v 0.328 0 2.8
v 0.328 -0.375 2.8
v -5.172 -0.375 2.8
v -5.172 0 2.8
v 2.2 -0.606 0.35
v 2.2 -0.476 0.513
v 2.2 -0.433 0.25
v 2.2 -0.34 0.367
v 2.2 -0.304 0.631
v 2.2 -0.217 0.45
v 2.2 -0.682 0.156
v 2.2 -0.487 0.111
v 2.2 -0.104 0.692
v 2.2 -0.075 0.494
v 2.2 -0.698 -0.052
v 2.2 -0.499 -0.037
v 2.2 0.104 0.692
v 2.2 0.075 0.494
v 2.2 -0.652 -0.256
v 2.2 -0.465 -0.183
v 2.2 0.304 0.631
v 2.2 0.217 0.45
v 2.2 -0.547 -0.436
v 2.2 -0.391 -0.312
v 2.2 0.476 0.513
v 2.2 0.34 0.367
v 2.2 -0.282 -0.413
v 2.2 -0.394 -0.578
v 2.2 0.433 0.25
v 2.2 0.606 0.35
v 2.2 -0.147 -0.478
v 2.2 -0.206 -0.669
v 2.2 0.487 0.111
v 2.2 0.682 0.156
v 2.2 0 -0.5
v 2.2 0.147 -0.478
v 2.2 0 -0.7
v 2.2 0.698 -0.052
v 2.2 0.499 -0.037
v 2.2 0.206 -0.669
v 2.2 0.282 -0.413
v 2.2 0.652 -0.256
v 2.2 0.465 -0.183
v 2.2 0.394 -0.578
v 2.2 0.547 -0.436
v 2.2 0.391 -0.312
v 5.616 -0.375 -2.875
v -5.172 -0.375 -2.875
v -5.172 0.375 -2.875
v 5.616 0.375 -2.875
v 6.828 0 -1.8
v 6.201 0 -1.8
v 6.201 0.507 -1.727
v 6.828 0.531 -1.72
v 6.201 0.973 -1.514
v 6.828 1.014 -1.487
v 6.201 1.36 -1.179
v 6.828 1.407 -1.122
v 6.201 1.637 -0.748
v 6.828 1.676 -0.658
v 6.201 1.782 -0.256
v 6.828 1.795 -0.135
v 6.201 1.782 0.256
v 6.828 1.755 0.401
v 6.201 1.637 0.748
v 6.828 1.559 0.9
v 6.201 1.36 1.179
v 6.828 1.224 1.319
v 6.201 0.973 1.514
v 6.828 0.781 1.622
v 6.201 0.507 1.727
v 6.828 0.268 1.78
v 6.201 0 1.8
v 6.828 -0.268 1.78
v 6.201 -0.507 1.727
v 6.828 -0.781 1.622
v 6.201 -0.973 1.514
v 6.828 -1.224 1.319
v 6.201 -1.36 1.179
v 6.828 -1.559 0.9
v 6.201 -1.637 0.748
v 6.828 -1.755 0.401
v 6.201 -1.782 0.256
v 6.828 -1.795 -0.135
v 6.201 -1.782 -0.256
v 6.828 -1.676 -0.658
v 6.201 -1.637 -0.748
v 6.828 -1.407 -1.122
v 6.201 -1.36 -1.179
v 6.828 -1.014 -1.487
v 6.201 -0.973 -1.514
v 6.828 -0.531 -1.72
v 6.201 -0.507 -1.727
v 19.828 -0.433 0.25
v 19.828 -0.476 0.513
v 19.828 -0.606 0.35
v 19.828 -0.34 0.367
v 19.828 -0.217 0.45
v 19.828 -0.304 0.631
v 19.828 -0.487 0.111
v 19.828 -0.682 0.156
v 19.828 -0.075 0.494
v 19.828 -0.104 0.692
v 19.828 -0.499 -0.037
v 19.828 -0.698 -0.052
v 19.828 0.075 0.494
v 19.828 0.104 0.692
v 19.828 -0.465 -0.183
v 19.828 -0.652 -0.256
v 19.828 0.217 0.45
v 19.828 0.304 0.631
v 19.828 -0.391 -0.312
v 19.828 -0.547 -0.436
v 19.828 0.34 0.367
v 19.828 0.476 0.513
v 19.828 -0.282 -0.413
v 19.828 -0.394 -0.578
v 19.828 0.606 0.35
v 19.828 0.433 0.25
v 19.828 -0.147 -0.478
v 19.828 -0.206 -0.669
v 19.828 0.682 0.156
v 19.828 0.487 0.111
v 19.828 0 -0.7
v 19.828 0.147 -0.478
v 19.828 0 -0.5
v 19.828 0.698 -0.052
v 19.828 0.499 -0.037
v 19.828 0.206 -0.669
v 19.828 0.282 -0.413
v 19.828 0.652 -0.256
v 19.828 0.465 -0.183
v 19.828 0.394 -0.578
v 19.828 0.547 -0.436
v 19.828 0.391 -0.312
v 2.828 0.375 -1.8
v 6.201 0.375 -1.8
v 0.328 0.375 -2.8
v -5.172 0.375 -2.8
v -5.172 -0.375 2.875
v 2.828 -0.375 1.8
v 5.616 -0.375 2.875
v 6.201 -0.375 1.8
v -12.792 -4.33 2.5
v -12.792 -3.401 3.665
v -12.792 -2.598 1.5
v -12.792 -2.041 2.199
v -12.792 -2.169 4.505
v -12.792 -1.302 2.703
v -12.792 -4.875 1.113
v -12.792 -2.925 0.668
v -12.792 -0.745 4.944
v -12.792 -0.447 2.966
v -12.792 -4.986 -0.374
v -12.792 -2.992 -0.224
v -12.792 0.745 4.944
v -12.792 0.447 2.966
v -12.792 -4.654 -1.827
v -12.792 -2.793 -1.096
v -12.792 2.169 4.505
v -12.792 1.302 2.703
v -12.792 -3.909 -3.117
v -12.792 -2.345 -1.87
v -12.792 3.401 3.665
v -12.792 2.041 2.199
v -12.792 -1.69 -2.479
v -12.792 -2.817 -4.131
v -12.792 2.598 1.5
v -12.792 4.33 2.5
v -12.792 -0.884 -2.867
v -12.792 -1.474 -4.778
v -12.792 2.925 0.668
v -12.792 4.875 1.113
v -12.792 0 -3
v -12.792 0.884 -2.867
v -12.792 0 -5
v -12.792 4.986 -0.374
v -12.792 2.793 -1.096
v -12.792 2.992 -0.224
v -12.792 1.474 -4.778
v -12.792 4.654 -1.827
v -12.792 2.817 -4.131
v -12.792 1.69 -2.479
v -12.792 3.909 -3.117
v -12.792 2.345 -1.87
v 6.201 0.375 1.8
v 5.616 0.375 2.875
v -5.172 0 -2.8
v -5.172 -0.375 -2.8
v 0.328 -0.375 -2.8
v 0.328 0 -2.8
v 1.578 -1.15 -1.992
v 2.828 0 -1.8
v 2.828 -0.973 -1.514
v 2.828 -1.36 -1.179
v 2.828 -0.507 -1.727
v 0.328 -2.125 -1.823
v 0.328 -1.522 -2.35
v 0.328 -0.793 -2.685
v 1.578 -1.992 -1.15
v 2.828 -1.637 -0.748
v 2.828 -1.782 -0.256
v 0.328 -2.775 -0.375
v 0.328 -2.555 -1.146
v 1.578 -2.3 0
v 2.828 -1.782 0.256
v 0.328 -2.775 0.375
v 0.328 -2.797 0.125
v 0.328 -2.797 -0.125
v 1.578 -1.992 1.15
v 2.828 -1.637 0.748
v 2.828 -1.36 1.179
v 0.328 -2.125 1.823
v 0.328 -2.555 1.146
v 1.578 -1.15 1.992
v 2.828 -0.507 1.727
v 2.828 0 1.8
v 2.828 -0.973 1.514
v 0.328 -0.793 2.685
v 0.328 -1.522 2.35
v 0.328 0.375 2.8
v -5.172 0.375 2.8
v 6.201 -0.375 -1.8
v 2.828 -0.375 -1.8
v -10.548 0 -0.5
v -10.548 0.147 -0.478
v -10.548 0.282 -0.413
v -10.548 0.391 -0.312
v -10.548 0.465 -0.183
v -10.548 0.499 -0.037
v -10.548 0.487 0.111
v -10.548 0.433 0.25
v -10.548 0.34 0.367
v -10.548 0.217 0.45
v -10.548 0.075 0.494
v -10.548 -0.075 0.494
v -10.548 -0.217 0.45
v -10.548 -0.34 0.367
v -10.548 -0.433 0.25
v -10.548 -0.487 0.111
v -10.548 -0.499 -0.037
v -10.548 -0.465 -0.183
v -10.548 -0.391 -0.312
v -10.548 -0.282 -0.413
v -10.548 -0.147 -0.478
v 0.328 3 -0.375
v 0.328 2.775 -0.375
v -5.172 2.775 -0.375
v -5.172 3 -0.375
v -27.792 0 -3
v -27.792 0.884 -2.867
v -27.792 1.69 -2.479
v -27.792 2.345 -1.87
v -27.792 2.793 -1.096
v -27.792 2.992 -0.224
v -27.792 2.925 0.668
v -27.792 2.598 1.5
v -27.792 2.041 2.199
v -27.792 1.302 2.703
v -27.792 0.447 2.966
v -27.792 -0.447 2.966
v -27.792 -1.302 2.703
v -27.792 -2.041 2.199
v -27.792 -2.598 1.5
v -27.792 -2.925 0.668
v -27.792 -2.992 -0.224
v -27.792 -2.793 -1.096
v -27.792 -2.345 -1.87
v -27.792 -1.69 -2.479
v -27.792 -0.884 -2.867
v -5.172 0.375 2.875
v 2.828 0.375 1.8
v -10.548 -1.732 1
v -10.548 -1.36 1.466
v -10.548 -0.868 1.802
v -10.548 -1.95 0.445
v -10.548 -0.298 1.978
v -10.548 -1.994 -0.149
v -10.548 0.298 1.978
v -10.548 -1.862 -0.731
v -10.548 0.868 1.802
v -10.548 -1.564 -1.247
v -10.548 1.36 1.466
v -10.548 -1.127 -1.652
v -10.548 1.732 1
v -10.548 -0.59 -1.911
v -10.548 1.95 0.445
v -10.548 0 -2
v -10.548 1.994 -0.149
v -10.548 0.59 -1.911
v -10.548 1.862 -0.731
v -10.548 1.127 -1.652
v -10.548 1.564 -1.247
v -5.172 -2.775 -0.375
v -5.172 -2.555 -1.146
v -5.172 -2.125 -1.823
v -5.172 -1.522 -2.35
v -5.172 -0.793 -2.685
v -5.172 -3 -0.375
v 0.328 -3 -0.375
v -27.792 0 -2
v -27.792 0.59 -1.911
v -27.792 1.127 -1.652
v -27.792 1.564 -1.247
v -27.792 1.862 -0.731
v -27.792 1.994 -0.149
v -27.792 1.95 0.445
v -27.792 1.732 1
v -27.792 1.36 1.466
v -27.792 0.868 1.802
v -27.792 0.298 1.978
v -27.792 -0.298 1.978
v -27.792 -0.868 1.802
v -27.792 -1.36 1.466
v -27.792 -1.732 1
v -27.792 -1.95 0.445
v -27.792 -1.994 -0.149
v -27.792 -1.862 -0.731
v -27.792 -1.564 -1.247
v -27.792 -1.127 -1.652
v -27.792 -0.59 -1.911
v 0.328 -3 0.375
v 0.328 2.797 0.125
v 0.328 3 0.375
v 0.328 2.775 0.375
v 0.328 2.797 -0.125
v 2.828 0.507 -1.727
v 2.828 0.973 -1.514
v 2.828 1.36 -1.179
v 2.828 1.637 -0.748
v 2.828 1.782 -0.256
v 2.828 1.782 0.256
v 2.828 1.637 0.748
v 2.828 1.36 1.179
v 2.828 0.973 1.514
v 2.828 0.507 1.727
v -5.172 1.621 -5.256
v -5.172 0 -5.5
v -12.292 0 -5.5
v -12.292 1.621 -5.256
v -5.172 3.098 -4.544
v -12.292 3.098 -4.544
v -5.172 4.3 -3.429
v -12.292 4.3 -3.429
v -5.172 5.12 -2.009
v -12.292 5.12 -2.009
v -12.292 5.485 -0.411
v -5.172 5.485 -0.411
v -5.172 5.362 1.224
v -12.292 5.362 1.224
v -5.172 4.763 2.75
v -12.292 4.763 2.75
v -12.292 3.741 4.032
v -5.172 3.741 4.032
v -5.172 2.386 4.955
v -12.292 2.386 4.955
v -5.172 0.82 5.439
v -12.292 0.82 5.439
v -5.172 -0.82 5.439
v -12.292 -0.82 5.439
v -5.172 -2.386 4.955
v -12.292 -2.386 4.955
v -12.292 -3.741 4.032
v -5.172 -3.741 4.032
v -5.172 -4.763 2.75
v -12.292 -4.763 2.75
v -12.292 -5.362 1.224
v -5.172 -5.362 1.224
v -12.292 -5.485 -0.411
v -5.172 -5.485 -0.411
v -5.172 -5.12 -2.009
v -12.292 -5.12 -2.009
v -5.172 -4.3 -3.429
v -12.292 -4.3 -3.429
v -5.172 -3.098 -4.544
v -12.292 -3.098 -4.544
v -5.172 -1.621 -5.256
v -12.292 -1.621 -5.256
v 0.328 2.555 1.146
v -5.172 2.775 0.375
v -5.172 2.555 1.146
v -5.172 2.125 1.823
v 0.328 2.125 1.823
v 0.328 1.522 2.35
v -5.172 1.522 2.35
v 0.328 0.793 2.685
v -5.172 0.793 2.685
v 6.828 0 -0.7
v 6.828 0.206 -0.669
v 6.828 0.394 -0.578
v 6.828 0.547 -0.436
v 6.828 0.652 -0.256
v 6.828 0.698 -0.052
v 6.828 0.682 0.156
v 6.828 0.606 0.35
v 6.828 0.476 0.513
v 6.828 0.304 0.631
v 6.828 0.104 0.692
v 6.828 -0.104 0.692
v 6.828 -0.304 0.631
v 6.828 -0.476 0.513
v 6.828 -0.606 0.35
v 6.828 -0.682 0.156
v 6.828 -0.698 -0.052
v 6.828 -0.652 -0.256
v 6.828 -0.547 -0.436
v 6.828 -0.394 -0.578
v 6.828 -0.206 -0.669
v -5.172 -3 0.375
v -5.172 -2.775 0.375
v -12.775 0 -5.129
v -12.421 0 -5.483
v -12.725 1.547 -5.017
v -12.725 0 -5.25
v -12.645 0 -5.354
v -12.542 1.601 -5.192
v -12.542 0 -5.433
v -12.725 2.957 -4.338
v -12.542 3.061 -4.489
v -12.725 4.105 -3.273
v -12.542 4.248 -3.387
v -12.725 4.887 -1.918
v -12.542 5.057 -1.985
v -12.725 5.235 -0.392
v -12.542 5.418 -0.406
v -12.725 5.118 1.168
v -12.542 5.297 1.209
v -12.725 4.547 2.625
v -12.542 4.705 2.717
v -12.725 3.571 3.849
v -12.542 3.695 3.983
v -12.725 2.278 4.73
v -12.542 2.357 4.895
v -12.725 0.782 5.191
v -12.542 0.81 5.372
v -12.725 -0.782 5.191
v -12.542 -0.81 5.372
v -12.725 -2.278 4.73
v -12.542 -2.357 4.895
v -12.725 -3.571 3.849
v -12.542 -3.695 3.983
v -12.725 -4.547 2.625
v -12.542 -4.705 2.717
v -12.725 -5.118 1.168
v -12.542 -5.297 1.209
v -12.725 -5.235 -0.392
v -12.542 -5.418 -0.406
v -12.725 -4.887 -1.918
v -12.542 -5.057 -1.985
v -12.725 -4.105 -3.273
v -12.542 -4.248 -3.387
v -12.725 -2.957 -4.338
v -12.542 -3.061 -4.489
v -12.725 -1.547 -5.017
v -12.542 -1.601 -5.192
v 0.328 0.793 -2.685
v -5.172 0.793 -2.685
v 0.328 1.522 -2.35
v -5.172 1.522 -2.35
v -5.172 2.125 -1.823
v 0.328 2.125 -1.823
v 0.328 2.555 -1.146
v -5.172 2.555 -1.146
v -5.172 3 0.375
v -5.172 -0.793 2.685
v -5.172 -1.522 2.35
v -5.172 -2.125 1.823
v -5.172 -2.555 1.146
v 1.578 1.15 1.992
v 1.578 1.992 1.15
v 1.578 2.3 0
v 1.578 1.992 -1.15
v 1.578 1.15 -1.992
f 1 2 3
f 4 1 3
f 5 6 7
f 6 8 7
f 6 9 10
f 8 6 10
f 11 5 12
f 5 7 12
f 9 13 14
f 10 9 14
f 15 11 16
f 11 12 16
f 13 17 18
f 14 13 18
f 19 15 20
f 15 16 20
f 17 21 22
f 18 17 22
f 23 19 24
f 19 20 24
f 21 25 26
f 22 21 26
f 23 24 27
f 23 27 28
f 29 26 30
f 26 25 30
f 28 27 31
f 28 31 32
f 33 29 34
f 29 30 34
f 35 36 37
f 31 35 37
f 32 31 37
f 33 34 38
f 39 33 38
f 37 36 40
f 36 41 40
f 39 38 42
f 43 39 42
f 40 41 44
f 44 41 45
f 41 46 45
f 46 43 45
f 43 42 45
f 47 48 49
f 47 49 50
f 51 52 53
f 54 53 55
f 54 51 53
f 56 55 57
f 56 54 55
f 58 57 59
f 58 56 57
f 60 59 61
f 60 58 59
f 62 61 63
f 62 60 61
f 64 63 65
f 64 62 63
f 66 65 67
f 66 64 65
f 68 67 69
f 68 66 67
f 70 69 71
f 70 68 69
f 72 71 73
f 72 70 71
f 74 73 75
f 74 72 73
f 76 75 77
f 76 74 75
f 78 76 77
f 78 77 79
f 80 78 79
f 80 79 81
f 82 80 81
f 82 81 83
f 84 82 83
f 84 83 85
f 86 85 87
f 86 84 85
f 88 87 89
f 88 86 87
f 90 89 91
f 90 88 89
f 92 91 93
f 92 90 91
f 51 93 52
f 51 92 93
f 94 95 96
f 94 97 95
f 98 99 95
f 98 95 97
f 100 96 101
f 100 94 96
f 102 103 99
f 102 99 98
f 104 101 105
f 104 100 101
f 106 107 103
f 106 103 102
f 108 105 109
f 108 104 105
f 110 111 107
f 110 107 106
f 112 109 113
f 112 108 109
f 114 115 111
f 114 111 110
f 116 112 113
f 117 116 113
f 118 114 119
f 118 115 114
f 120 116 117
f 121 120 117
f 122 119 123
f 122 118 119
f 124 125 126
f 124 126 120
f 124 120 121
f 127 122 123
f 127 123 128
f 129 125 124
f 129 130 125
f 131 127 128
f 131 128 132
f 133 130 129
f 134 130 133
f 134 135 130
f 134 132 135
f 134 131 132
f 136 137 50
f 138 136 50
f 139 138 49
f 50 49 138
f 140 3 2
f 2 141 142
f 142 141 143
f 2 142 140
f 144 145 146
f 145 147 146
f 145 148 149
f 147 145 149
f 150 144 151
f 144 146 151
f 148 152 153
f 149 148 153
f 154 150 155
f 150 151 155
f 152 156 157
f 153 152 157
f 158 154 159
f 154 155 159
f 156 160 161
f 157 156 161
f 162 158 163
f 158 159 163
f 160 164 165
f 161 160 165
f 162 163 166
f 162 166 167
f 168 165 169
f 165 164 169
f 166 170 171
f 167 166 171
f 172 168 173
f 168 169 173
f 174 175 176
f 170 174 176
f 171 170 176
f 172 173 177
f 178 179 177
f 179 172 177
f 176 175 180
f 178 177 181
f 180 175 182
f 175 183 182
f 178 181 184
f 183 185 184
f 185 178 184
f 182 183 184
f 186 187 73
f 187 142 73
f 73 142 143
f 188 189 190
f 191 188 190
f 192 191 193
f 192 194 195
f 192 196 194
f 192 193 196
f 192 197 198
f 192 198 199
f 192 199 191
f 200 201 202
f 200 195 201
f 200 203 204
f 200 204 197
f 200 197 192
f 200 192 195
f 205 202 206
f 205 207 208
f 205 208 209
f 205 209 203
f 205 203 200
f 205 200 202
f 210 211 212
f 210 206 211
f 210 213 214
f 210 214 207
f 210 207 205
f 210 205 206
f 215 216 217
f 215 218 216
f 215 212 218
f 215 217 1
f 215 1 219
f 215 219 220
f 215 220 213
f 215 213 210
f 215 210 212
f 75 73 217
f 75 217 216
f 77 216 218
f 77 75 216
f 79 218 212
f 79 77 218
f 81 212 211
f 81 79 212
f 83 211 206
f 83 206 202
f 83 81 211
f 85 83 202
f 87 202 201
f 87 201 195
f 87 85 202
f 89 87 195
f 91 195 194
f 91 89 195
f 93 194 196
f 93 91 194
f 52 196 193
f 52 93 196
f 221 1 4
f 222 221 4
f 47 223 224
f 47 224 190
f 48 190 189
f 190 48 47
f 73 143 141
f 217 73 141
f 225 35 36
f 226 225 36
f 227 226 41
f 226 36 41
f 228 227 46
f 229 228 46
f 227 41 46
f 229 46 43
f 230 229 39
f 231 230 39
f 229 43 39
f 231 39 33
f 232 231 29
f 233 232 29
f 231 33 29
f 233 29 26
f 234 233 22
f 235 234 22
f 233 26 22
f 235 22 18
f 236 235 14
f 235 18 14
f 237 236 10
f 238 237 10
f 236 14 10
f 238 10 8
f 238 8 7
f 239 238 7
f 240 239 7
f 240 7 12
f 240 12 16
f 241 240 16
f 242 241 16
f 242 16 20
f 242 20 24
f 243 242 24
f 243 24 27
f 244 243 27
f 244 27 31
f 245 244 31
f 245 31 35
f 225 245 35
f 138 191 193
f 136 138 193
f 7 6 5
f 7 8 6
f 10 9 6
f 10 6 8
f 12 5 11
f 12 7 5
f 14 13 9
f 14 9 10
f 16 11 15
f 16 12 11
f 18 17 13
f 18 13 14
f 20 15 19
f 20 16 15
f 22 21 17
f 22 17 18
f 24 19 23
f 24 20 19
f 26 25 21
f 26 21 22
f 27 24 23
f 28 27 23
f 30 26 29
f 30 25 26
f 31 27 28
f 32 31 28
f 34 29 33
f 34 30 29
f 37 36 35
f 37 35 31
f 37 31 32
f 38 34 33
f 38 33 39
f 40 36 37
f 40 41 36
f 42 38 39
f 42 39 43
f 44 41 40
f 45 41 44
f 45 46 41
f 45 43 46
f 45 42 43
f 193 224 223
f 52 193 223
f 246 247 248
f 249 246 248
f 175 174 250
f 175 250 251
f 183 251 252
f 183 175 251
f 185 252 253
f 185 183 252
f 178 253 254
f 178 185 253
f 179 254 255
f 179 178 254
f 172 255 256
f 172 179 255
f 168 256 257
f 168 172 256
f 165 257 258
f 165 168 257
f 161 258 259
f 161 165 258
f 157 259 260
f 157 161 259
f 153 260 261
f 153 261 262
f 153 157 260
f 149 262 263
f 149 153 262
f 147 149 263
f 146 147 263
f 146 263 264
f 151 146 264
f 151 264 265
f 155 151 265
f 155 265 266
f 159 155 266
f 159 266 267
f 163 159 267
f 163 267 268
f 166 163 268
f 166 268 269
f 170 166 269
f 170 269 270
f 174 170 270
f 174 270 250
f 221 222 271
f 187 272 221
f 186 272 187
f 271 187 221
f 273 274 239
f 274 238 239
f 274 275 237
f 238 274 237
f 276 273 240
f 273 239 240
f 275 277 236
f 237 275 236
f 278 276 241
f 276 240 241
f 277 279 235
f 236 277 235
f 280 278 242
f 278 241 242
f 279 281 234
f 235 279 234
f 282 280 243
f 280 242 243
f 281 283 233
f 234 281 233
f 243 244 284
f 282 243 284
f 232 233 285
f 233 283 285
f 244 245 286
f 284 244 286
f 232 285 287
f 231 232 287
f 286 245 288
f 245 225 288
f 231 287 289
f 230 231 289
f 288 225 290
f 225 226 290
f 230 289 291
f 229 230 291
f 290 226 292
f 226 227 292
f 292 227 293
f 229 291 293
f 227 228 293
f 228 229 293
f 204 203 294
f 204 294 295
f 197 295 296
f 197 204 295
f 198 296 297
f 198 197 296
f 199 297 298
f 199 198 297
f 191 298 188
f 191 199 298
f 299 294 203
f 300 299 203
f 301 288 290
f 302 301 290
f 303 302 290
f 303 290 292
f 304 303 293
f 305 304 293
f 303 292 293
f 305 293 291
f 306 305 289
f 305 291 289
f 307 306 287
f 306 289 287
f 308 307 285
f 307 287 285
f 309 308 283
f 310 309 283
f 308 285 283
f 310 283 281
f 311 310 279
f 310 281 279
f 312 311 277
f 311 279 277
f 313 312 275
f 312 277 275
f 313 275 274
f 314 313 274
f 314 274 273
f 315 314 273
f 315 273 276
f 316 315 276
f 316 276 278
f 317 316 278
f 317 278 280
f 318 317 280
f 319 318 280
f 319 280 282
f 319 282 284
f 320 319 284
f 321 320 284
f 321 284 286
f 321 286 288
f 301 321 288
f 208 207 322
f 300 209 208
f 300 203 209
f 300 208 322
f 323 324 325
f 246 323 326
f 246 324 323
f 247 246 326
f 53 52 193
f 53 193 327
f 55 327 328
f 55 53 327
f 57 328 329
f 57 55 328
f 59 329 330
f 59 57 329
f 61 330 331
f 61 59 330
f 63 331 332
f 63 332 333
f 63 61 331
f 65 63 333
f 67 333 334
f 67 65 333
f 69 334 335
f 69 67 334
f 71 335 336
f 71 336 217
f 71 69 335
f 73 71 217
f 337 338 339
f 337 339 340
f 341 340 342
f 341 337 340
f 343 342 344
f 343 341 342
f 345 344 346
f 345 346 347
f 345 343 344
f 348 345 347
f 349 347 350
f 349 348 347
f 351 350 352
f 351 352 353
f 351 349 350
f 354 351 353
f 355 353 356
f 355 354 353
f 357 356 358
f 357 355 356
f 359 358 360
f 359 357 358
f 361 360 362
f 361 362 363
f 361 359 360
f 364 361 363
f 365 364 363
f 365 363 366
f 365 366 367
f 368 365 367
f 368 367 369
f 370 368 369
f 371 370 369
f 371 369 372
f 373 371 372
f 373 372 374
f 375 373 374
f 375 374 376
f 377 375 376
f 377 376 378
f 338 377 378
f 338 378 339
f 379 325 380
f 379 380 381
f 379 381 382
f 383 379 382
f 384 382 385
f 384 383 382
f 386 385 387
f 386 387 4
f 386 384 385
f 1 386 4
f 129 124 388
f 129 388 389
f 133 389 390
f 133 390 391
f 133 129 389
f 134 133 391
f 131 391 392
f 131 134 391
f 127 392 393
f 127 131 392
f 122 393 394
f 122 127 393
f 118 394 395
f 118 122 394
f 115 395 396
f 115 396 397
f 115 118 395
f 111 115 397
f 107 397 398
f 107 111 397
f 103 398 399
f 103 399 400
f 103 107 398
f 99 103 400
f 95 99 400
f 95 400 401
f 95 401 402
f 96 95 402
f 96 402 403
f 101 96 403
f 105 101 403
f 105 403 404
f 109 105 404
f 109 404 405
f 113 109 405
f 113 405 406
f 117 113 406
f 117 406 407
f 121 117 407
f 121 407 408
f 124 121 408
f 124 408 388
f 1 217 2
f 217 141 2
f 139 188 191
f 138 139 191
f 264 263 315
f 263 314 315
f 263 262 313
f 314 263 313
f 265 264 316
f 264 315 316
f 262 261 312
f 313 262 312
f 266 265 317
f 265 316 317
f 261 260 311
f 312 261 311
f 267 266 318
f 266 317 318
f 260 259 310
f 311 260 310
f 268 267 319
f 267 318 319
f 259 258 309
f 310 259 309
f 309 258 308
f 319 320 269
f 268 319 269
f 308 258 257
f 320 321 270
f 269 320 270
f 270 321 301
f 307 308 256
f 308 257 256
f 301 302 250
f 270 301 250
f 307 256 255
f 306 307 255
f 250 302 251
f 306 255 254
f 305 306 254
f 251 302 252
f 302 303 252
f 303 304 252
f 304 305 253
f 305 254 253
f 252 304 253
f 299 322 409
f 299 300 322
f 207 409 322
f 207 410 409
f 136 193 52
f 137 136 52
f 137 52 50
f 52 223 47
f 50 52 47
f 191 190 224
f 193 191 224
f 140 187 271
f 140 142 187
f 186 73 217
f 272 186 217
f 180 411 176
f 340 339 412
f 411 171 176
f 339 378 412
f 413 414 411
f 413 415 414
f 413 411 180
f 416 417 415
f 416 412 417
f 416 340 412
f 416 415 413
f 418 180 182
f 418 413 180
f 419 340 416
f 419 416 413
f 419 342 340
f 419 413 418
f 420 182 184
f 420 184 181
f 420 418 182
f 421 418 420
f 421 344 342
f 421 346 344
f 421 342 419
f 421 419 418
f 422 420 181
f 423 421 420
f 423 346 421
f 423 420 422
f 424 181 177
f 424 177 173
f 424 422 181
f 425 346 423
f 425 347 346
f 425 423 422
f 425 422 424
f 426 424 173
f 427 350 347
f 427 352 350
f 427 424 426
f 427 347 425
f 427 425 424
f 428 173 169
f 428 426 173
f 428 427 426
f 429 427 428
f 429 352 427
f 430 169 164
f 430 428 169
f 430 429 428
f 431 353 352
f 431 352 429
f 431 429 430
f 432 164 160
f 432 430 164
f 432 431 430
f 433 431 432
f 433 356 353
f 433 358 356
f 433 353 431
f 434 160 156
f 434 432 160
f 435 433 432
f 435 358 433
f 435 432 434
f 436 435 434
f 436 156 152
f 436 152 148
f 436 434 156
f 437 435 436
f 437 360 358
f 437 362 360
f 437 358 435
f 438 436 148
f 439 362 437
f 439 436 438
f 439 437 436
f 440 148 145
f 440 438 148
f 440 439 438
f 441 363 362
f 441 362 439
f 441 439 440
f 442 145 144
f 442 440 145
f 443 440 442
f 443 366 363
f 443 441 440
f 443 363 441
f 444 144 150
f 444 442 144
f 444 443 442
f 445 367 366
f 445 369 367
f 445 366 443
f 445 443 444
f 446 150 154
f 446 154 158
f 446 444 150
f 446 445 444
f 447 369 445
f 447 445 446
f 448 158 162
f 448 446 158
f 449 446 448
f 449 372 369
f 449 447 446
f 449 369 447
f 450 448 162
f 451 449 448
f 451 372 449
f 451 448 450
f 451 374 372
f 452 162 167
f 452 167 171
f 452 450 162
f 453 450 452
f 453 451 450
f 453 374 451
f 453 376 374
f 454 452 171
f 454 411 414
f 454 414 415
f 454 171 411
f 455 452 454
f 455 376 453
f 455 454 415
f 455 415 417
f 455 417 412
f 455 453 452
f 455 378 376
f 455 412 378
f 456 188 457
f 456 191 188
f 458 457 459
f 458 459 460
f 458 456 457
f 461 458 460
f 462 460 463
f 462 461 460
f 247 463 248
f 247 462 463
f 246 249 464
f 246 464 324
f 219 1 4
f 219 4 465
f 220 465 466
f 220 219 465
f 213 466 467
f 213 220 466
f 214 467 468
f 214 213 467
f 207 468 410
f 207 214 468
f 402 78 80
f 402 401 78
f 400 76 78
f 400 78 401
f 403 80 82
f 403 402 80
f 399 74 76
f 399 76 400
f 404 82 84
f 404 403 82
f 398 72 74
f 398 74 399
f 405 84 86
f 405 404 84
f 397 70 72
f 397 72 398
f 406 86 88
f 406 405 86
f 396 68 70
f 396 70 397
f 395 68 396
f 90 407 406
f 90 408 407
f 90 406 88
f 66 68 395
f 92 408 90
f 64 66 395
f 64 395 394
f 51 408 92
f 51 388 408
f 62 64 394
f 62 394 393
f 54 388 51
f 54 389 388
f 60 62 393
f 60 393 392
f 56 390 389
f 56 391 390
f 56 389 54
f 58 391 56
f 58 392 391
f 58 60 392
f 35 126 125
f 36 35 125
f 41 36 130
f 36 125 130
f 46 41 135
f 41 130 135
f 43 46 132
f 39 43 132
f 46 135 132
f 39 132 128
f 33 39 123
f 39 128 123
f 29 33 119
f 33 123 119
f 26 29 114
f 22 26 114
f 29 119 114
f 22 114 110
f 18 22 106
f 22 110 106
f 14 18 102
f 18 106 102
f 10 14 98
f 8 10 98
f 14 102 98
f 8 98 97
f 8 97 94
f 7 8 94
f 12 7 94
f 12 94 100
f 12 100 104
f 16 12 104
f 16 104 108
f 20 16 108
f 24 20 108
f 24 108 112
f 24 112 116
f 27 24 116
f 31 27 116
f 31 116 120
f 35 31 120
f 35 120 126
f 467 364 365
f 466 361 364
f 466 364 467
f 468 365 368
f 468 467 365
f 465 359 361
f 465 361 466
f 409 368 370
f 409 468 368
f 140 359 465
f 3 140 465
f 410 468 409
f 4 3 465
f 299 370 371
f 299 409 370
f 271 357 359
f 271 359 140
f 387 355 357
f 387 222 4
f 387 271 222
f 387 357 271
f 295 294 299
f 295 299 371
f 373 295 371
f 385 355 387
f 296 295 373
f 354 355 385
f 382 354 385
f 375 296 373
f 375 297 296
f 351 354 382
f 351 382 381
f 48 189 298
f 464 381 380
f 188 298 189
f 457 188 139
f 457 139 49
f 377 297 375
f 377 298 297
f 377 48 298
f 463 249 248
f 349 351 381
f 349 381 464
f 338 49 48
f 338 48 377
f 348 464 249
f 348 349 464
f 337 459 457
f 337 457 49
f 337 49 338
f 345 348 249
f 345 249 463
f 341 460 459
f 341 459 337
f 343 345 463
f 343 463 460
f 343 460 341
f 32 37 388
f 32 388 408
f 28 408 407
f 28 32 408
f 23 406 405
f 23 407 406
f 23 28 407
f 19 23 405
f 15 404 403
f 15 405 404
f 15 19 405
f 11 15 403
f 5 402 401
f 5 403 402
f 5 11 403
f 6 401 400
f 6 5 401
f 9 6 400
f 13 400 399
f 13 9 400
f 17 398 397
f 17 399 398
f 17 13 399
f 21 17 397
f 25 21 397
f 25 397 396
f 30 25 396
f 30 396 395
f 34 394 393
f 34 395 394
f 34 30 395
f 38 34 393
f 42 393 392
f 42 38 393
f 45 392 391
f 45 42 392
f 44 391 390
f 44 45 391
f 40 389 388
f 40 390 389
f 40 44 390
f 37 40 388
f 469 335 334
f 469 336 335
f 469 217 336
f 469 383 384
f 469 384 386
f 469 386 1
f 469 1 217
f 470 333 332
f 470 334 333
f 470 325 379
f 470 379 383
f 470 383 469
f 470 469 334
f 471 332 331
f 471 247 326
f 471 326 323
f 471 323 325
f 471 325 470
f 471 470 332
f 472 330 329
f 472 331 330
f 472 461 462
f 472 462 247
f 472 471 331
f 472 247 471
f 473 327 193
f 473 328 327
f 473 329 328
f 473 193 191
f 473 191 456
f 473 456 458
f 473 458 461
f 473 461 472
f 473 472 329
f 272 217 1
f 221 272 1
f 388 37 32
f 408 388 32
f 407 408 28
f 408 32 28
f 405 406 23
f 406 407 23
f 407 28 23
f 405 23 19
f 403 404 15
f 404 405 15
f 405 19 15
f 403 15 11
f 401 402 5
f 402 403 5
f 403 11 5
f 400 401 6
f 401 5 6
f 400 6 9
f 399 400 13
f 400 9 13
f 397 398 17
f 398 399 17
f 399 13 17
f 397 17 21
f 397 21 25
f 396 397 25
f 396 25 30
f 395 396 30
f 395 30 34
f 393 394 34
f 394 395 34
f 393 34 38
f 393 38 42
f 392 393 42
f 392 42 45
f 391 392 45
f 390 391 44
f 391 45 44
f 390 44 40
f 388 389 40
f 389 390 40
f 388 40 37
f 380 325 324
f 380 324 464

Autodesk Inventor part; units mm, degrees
ref_plane "YZ Plane" through (0, 0, 0) normal (1, 0, 0) x (0, 1, 0)
ref_plane "XZ Plane" through (0, 0, 0) normal (0, 1, 0) x (-1, 0, 0)
ref_plane "XY Plane" through (0, 0, 0) normal (0, 0, 1) x (1, 0, 0)
sketch "Sketch1" plane through (0, 0, 0) normal (0, 1, 0) x (-1, 0, 0)
  line L0 (37.3156, 0) -> (-29.3524, 0) projected
  line L1 (27.7916, -3) -> (12.7916, -3)
  line L2 (12.7916, -3) -> (12.7916, -5.5)
  line L3 (12.7916, -5.5) -> (5.1716, -5.5)
  line L4 (5.1716, -5.5) -> (5.1716, -2.8)
  line L5 (5.1716, -2.8) -> (-0.3284, -2.8)
  line L6 (-6.8284, -0.7) -> (-19.8284, -0.7)
  line L7 (-19.8284, -0.7) -> (-19.8284, -0.5)
  line L8 (27.7916, -3) -> (27.7916, -2)
  line L9 (27.7916, -2) -> (10.5479, -2)
  line L10 (10.5479, -2) -> (10.5479, -0.5)
  line L11 (10.5479, -0.5) -> (-2.1995, -0.5)
  line L12 (-0.3284, -2.8) -> (-2.8284, -1.8)
  line L13 (-2.8284, -1.8) -> (-6.8284, -1.8)
  line L14 (-0.3284, -2.8) -> (-5.6566, -2.8)
  line L15 (-6.8284, -1.8) -> (-6.8284, -0.7)
  line L16 (5.1716, -2.8753) -> (-5.6156, -2.8753)
  line L17 (-6.2013, -1.8) -> (-5.6156, -2.8753)
  line L18 (-6.8284, -0.7) -> (-2.1995, -0.7)
  line L19 (-2.1995, -0.7) -> (-2.1995, -0.5)
  line L20 (-2.1995, -0.5) -> (-19.8284, -0.5)
  point P0 (0, 0)
  dimension "d0" = 11
  dimension "d1" = 7.62
  dimension "d3" = 25
  dimension "d4" = 6
  dimension "d5" = 4
  dimension "d6" = 15
  dimension "d8" = 1
  dimension "d9" = 0.2
  dimension "d11" = 5.6
  dimension "d12" = 5.5
  dimension "d13" = 3.6
  dimension "d14" = 4
  dimension "d15" = 12
revolve "Revolution1" add sketch "Sketch1" angle 360 about axis through (-10, 0, 0) along (1, 0, 0) contours L1 L2 L3 L4 L5 L12 L13 L15 L18 L19 L11 L10 L9 L8
fillet "Fillet1" radius 0.5 1 edges at (-12.7916, 0, 5.5)
extrude "Extrusion1" add sketch "Sketch1" along normal mid plane 0.75 contours L16 L17 L14 L5 L4 | L14 L17 L13 L12
mirror "Mirror1" about plane through (0, 0, 0) normal (0, 0, 1) of "Extrusion1"
sketch "Sketch2" plane through (0, 0, 0) normal (0, 0, 1) x (1, 0, 0)
  line L0 (-5.1716, -2.8) -> (0.3284, -2.8) projected
  line L1 (-5.1716, -5.5) -> (-5.1716, 5.5) projected
  line L2 (0.3284, -2.8) -> (0.3284, -3)
  line L3 (0.3284, -3) -> (-5.1716, -3)
  line L4 (-5.1716, -3) -> (-5.1716, -1.8448)
  line L5 (-5.1716, -1.8448) -> (0.3284, -1.8448)
  line L6 (0.3284, -1.8448) -> (0.3284, -2.8)
  point P0 (0, 0)
  dimension "d18" = 0.2
extrude "Extrusion2" add sketch "Sketch2" along normal mid plane 0.75
mirror "Mirror2" about plane through (0, 0, 0) normal (0, 1, 0) of "Extrusion2"
revolve "Revolution2" add sketch "Sketch1" angle 360 about axis through (-10, 0, 0) along (1, 0, 0) separate body contours L19 L18 L6 L7 L20
properties part number "syringe_tip_14"
